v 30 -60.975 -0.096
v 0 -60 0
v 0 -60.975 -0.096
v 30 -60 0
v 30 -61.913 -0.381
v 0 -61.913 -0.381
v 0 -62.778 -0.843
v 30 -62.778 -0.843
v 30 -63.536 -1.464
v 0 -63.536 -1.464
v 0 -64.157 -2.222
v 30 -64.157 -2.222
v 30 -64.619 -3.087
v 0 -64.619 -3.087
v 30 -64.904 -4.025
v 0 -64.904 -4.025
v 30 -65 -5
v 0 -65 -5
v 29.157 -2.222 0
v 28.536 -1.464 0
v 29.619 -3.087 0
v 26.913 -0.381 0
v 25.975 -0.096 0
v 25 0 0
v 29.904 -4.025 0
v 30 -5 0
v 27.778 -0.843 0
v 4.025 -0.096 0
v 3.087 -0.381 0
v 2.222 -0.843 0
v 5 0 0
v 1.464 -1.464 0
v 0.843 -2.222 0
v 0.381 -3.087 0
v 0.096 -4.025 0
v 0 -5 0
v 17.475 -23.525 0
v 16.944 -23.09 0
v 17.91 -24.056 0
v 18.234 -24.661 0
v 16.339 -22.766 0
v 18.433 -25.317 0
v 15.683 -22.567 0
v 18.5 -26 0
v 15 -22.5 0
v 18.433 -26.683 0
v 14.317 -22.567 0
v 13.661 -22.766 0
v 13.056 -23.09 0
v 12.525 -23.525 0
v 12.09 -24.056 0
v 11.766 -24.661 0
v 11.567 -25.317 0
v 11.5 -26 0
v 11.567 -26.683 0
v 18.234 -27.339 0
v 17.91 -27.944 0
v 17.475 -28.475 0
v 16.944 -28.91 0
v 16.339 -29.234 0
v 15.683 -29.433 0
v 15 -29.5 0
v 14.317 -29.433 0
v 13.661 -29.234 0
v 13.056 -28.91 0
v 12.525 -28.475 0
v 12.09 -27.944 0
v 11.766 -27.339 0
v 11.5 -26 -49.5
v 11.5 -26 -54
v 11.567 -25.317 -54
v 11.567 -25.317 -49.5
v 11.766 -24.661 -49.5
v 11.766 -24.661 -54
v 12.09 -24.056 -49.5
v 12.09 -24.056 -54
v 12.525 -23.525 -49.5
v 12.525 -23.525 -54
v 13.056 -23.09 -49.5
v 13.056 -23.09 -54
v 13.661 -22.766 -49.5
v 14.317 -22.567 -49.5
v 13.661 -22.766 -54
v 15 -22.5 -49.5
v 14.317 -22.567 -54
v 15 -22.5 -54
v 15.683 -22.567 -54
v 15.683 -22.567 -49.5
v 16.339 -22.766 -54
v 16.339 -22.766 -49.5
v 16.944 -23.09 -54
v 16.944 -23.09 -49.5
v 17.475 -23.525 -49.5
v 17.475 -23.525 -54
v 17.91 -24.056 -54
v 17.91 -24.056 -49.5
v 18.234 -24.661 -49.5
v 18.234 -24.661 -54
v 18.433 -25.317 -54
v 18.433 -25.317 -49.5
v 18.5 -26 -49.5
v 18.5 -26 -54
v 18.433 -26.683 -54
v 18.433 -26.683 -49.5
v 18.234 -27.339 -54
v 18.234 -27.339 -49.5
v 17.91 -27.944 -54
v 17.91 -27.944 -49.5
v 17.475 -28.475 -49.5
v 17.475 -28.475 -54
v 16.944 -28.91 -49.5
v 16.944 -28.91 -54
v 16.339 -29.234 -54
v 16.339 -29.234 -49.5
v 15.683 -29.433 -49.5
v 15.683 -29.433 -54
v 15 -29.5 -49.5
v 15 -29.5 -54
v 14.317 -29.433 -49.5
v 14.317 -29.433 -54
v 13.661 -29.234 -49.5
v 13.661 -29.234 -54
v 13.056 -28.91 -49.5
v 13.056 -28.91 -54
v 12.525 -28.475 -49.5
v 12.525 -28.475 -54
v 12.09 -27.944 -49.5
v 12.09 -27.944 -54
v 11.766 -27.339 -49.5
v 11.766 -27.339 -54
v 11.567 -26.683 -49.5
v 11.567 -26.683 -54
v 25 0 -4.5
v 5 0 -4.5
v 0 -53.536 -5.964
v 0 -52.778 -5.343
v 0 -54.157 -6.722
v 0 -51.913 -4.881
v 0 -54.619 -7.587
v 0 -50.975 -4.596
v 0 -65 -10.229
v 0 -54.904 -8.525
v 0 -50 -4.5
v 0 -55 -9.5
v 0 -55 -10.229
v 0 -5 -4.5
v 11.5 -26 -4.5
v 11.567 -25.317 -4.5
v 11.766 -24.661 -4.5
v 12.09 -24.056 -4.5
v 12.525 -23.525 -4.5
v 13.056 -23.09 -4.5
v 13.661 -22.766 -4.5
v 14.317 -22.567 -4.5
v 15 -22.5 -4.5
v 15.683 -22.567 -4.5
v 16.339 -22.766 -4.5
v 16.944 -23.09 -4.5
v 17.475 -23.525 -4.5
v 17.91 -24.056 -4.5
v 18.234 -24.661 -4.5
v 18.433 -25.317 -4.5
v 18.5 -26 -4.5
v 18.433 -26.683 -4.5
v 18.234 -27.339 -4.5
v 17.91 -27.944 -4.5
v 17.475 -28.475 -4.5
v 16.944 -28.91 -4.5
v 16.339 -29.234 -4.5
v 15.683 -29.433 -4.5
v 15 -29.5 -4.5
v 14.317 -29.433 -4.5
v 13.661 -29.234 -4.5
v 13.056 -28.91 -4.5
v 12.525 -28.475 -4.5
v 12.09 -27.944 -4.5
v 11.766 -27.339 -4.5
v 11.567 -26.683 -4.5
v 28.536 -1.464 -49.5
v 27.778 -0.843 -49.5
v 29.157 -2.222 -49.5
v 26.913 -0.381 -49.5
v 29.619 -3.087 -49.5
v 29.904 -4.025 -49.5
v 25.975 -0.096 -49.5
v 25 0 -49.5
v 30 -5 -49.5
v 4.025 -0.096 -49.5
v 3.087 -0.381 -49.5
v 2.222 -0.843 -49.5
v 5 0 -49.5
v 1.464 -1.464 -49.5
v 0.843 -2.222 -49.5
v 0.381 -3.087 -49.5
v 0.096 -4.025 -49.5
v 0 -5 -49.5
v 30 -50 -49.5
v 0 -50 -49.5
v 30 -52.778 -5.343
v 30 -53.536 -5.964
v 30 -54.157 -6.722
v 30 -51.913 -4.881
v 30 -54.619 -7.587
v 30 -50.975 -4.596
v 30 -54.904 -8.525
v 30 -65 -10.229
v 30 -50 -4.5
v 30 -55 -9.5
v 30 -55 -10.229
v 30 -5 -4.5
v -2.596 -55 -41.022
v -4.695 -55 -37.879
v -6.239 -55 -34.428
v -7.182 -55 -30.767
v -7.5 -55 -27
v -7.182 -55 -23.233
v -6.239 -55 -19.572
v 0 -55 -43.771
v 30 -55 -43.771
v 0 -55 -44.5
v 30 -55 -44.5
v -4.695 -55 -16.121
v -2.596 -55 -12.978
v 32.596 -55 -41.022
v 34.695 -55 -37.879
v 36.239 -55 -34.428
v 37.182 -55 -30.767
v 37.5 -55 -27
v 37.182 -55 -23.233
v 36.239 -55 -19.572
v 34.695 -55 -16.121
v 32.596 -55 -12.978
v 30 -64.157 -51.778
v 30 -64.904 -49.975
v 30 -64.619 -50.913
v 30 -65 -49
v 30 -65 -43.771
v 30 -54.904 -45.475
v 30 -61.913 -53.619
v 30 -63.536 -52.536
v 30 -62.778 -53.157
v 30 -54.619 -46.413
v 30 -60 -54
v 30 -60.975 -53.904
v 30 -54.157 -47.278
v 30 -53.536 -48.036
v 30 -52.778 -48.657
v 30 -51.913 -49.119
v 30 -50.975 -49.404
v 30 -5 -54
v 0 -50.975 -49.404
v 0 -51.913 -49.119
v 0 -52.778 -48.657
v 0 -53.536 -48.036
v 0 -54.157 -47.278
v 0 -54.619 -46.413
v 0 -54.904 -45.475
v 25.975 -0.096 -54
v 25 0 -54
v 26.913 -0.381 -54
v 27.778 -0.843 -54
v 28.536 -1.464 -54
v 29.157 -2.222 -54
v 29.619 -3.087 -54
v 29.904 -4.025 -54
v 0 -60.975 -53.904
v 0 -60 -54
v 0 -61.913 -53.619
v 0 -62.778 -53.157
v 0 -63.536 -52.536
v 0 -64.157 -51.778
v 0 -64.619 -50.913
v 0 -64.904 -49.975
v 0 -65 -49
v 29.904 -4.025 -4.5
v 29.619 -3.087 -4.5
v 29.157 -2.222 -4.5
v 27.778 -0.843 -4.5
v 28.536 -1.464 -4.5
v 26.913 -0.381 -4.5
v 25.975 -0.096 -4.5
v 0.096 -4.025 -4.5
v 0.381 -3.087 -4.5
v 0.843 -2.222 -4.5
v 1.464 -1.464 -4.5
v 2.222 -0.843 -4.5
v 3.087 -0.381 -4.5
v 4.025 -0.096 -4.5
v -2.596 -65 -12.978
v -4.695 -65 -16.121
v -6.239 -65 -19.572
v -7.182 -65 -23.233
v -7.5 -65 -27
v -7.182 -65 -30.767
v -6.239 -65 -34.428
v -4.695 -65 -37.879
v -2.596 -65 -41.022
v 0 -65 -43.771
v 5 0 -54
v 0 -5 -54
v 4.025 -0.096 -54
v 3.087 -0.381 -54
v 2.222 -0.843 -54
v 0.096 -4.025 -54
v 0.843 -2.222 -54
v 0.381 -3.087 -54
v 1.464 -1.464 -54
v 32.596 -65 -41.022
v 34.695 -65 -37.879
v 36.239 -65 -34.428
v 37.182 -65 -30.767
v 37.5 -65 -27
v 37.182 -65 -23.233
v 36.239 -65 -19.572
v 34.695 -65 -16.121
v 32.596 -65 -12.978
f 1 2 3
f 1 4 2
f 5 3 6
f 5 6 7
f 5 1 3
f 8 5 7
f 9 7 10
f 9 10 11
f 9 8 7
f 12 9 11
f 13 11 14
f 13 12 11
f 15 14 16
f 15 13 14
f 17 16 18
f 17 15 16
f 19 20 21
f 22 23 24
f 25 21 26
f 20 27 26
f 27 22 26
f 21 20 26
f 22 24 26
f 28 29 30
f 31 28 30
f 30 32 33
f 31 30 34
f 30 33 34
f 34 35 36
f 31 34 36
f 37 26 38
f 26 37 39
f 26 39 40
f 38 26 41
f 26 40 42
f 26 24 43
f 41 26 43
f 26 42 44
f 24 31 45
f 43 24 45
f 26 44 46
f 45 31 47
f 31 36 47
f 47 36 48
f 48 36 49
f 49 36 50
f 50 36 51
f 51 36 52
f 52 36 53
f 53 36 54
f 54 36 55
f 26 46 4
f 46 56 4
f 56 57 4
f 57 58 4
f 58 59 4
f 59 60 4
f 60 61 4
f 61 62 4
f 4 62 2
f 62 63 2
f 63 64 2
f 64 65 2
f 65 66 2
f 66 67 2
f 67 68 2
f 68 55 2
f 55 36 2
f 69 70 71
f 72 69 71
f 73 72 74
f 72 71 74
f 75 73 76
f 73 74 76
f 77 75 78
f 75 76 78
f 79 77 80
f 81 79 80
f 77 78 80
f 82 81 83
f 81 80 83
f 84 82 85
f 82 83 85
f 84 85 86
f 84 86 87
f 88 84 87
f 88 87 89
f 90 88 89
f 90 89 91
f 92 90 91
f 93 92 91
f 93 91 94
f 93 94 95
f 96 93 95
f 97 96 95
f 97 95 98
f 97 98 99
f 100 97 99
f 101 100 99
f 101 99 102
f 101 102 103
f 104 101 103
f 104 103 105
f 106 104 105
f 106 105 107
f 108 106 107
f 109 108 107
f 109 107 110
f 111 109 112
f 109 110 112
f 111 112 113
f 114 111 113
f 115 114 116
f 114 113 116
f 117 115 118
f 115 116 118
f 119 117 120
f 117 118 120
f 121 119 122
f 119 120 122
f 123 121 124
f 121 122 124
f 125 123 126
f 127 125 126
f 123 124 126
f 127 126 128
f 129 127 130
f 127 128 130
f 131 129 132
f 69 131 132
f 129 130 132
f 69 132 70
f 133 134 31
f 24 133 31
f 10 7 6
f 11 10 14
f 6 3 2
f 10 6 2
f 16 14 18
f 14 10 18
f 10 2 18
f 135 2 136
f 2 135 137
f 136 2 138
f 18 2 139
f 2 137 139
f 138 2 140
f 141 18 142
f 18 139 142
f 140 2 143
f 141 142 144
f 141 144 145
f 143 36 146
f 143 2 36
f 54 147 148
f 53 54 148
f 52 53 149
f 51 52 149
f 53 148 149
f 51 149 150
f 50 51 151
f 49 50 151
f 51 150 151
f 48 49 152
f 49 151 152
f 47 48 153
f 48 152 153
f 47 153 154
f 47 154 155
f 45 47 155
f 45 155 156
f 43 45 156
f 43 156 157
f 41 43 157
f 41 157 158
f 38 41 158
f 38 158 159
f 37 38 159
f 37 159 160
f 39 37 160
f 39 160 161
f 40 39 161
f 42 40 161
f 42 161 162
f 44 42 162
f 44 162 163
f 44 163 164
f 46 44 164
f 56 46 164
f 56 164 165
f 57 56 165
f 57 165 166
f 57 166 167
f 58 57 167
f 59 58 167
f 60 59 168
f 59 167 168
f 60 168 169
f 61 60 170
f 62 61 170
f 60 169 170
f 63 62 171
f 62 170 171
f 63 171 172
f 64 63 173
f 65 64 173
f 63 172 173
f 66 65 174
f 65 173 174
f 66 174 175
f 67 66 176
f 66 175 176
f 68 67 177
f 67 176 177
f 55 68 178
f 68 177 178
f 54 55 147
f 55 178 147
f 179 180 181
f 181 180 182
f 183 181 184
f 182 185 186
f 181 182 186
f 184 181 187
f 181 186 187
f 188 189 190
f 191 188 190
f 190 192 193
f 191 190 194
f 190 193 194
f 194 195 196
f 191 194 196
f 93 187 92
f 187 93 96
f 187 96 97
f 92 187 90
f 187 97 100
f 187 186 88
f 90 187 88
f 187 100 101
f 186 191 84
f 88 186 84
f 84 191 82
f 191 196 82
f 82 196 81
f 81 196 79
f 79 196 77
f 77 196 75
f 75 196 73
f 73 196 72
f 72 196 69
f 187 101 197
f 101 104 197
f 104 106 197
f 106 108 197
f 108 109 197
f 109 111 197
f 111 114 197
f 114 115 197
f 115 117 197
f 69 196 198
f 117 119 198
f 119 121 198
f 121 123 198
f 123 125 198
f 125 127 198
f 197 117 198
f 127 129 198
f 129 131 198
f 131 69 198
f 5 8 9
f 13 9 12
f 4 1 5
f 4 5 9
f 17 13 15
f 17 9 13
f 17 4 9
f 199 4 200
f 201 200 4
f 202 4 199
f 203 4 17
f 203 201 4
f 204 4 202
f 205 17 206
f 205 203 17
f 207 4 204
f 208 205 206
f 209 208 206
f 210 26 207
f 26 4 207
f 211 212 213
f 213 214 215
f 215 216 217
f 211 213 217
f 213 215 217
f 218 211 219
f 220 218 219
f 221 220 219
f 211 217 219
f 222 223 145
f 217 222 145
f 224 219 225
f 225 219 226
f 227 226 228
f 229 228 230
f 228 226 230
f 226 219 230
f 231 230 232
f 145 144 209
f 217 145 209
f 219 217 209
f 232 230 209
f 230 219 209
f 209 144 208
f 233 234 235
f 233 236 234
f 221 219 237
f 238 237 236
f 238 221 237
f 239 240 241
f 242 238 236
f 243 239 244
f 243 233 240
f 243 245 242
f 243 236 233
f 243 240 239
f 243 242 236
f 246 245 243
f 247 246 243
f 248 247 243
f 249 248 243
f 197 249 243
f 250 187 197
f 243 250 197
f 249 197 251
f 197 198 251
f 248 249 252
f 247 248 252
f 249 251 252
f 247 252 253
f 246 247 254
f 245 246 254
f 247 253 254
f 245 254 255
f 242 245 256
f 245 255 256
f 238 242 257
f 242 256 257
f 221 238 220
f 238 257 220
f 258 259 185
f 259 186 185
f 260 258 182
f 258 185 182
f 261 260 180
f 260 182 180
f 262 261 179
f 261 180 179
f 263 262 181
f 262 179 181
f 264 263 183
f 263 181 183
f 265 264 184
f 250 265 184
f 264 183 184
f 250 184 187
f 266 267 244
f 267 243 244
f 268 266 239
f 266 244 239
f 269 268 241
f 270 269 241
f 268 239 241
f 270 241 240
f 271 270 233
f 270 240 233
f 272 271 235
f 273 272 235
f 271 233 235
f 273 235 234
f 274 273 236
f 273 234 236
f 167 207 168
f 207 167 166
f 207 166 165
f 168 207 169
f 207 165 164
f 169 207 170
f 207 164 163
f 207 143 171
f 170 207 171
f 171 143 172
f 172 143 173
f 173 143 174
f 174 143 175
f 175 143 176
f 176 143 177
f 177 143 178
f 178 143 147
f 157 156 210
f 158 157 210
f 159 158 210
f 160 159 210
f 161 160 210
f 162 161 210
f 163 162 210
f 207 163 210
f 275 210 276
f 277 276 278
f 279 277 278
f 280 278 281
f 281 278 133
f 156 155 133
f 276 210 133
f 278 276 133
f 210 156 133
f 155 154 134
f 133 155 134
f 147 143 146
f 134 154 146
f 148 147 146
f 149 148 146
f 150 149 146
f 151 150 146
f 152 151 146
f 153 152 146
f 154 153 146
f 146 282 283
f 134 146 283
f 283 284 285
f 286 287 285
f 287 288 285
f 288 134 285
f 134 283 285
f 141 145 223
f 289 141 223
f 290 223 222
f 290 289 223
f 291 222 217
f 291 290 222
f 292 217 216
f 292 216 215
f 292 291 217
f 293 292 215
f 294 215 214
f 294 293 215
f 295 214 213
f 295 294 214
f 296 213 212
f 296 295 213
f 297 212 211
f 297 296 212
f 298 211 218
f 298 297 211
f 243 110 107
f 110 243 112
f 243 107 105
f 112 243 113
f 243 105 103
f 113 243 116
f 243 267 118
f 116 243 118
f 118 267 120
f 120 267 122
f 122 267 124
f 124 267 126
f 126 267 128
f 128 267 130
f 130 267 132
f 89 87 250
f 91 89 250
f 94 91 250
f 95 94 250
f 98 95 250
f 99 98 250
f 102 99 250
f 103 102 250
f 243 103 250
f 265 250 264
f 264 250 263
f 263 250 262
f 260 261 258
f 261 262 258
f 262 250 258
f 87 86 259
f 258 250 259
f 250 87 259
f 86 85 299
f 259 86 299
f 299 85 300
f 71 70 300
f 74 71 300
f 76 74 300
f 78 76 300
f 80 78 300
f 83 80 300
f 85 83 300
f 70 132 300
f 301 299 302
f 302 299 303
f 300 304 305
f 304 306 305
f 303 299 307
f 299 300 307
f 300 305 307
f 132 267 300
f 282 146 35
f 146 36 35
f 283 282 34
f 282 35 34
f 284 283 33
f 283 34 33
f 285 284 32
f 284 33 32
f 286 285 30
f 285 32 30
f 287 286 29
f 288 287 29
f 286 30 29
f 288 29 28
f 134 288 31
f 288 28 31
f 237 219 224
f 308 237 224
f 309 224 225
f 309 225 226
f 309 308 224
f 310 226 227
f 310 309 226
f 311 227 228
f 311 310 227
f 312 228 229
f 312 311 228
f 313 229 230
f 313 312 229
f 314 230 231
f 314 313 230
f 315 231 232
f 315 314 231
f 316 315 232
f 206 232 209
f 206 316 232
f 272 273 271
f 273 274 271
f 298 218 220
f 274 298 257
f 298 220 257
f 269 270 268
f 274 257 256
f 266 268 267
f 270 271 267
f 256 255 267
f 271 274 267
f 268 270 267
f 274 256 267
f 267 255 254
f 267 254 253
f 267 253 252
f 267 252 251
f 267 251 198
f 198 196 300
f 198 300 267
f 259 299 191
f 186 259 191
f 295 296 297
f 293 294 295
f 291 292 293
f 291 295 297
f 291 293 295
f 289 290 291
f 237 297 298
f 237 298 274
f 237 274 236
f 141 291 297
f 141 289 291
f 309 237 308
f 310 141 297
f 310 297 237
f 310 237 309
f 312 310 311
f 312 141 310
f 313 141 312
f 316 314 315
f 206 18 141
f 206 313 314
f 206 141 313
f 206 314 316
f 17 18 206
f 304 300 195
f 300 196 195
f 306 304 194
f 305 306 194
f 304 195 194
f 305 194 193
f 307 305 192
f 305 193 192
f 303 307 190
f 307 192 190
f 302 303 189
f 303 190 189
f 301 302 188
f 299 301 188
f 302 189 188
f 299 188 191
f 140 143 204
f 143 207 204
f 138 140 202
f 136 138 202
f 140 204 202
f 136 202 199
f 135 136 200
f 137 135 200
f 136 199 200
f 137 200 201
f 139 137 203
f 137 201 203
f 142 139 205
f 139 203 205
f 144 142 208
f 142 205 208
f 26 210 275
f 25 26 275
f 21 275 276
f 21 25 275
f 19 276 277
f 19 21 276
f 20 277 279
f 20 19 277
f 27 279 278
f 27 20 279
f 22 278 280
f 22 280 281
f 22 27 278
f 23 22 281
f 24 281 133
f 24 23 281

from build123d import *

# Parameters (mm, degrees)
BOSS_EXTRUDE1_DEPTH = 30
SKETCH3_R           = 22.5
BOSS_EXTRUDE2_DEPTH = 10
FILLET2_R           = 5
SKETCH4_R           = 3.5
CUT_EXTRUDE1_DEPTH  = 70


with BuildPart() as part:
    # Sketch1 → Boss-Extrude1 (new body)
    with BuildSketch(Plane(origin=(0, 0, 0), x_dir=(0, 0, -1), z_dir=(1, 0, 0))):
        Polygon((0, 0), (0, -65), (54, -65), (54, 0), (49.5, 0), (49.5, -55), (4.5, -55), (4.5, 0), align=None)
    extrude(amount=BOSS_EXTRUDE1_DEPTH)

    # Sketch3 → Boss-Extrude2 (add)
    with BuildSketch(Plane.XZ.offset(65)):
        with Locations((15, -27)):
            Circle(SKETCH3_R)
    extrude(amount=-BOSS_EXTRUDE2_DEPTH)

    # Fillet2
    fillet2_edges = [part.edges().sort_by_distance(p)[0] for p in [
        (0, 0, -2.25),
        (15, -55, -4.5),
        (15, -55, -49.5),
        (15, -65, -54),
        (15, -65, 0),
        (30, 0, -51.75),
        (30, 0, -2.25),
        (0, 0, -51.75),
    ]]
    fillet(fillet2_edges, radius=FILLET2_R)

    # Sketch4 → Cut-Extrude1 (cut)
    with BuildSketch(Plane(origin=(0, 0, -54), x_dir=(-1, 0, 0), z_dir=(0, 0, -1))):
        with Locations((-15, -26)):
            Circle(SKETCH4_R)
    extrude(amount=-CUT_EXTRUDE1_DEPTH, mode=Mode.SUBTRACT)


solid = part.part
